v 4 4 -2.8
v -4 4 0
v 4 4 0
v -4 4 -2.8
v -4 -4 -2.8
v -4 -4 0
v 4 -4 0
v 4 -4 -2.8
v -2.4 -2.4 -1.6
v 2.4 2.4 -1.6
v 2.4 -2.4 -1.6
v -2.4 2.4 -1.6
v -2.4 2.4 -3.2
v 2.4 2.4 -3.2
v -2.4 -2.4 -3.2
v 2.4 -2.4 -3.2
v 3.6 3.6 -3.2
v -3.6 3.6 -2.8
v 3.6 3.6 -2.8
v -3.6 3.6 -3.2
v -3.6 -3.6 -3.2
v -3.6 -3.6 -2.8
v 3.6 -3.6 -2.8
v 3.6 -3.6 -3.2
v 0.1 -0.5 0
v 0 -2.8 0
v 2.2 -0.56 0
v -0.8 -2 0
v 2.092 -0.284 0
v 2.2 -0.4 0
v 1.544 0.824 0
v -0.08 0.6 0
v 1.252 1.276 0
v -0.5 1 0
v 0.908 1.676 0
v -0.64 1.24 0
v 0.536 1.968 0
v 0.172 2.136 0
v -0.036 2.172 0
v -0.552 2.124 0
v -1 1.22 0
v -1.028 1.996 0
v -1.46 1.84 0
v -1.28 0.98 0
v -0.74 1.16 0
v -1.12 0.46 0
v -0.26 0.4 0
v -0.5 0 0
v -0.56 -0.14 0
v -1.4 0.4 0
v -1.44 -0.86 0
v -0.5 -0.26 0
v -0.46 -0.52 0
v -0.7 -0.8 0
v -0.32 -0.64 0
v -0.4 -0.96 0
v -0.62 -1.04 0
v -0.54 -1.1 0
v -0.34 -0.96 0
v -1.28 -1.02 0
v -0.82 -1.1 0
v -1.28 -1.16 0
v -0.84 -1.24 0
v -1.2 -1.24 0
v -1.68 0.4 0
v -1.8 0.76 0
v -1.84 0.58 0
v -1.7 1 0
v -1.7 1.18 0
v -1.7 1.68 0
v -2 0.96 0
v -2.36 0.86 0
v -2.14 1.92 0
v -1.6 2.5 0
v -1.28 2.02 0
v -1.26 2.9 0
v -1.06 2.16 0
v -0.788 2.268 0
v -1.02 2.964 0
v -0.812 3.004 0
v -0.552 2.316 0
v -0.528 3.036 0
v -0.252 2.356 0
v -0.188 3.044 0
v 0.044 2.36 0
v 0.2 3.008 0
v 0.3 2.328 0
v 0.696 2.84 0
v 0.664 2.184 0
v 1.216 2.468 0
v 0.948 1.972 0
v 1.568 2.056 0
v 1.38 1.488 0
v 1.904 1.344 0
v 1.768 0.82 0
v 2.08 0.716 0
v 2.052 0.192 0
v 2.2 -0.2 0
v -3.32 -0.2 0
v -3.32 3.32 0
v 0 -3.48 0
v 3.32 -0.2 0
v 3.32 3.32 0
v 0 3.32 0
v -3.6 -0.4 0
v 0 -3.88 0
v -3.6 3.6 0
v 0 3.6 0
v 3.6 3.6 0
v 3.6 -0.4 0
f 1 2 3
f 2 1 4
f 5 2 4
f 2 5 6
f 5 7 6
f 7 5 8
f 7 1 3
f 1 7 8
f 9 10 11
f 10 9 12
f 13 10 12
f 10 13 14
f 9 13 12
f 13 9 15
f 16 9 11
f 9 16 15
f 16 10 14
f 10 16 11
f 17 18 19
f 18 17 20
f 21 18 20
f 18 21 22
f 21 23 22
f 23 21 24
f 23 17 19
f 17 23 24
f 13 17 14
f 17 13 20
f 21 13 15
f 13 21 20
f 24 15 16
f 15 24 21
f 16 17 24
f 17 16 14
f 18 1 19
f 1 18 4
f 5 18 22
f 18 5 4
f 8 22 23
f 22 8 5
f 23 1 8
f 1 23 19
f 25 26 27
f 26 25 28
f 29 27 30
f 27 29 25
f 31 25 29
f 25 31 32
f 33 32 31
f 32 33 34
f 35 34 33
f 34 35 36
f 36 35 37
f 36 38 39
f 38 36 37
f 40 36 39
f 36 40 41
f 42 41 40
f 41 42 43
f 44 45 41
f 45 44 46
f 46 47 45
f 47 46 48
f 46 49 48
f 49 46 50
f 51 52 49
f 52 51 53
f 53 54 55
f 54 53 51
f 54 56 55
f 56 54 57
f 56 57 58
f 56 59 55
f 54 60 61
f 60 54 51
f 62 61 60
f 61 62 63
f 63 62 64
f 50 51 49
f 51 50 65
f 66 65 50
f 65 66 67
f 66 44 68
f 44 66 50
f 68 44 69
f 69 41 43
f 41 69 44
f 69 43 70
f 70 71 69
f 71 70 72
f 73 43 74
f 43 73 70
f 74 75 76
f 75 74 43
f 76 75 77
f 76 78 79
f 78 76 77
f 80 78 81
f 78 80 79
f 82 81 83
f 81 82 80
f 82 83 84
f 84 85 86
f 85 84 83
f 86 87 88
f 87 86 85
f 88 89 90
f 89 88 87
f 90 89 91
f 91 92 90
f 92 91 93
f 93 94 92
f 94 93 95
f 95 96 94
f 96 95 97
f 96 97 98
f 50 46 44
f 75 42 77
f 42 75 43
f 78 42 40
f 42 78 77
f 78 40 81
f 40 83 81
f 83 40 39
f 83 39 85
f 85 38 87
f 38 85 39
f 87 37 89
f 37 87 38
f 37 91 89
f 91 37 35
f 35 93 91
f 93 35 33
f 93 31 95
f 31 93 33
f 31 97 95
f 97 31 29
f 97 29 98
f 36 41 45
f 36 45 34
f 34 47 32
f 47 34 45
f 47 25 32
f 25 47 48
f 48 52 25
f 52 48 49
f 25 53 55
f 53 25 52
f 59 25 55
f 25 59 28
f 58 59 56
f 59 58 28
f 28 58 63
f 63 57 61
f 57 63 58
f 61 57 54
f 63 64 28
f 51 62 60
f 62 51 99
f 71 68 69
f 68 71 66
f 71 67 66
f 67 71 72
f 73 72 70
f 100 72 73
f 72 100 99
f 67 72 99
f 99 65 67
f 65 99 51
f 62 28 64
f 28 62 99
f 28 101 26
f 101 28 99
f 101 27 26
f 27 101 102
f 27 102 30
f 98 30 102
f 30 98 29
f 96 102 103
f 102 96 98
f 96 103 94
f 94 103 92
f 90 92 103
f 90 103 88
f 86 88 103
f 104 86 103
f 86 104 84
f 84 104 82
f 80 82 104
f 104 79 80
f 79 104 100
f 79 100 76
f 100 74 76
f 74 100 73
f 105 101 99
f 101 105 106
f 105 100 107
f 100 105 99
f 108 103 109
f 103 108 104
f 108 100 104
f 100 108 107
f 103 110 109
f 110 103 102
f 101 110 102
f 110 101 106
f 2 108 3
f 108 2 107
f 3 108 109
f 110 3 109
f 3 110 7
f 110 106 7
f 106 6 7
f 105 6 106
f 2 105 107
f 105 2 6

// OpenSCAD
// file: ../p/box5.scad
use <../lib.scad>
function ldraw_lib__box5() = [
// 0 Box with 5 Faces and All Edges
// 0 Name: box5.dat
// 0 Author: James Jessiman
// 0 !LDRAW_ORG Primitive UPDATE 2012-01
// 0 !LICENSE Licensed under CC BY 4.0 : see CAreadme.txt
// 
// 0 BFC CERTIFY CCW
  [0,"BFC","CERTIFY"],
  [0,"BFC","CCW"],
// 
// 0 !HISTORY 2002-04-03 [sbliss] Modified for BFC compliance
// 0 !HISTORY 2002-04-25 [PTadmin] Official Update 2002-02
// 0 !HISTORY 2007-06-24 [PTadmin] Header formatted for Contributor Agreement
// 0 !HISTORY 2008-07-01 [PTadmin] Official Update 2008-01
// 0 !HISTORY 2012-02-16 [Philo] Changed to CCW
// 0 !HISTORY 2012-03-30 [PTadmin] Official Update 2012-01
// 
// 
// 2 24 1 1 1 -1 1 1
  [2,24,1,1,1,-1,1,1],
// 2 24 -1 1 1 -1 1 -1
  [2,24,-1,1,1,-1,1,-1],
// 2 24 -1 1 -1 1 1 -1
  [2,24,-1,1,-1,1,1,-1],
// 2 24 1 1 -1 1 1 1
  [2,24,1,1,-1,1,1,1],
// 2 24 1 0 1 -1 0 1
  [2,24,1,0,1,-1,0,1],
// 2 24 -1 0 1 -1 0 -1
  [2,24,-1,0,1,-1,0,-1],
// 2 24 -1 0 -1 1 0 -1
  [2,24,-1,0,-1,1,0,-1],
// 2 24 1 0 -1 1 0 1
  [2,24,1,0,-1,1,0,1],
// 2 24 1 0 1 1 1 1
  [2,24,1,0,1,1,1,1],
// 2 24 -1 0 1 -1 1 1
  [2,24,-1,0,1,-1,1,1],
// 2 24 1 0 -1 1 1 -1
  [2,24,1,0,-1,1,1,-1],
// 2 24 -1 0 -1 -1 1 -1
  [2,24,-1,0,-1,-1,1,-1],
// 4 16 -1 1 1 1 1 1 1 1 -1 -1 1 -1
  [4,16,-1,1,1,1,1,1,1,1,-1,-1,1,-1],
// 4 16 -1 1 1 -1 0 1 1 0 1 1 1 1
  [4,16,-1,1,1,-1,0,1,1,0,1,1,1,1],
// 4 16 -1 1 -1 -1 0 -1 -1 0 1 -1 1 1
  [4,16,-1,1,-1,-1,0,-1,-1,0,1,-1,1,1],
// 4 16 1 1 -1 1 0 -1 -1 0 -1 -1 1 -1
  [4,16,1,1,-1,1,0,-1,-1,0,-1,-1,1,-1],
// 4 16 1 1 1 1 0 1 1 0 -1 1 1 -1
  [4,16,1,1,1,1,0,1,1,0,-1,1,1,-1],
];
module ldraw_lib__box5(step=0, col=false, unit=2/5, alt=false, line=0.2, solid=!$preview)
    makepoly(ldraw_lib__box5(), step=step, col=col, unit=unit, alt=alt, line=line, solid=solid);
ldraw_lib__box5(line=0.2);
// file: ../p/box4.scad
use <../lib.scad>
function ldraw_lib__box4() = [
// 0 Box with 4 Faces (2 Parallel Pairs) and All Edges
// 0 Name: box4.dat
// 0 Author: James Jessiman
// 0 !LDRAW_ORG Primitive UPDATE 2012-01
// 0 !LICENSE Licensed under CC BY 4.0 : see CAreadme.txt
// 
// 0 BFC CERTIFY CCW
  [0,"BFC","CERTIFY"],
  [0,"BFC","CCW"],
// 
// 0 !HISTORY 2002-04-03 [sbliss] Modified for BFC compliance
// 0 !HISTORY 2002-04-25 [PTadmin] Official Update 2002-02
// 0 !HISTORY 2007-06-24 [PTadmin] Header formatted for Contributor Agreement
// 0 !HISTORY 2008-07-01 [PTadmin] Official Update 2008-01
// 0 !HISTORY 2012-02-16 [Philo] Changed to CCW
// 0 !HISTORY 2012-03-30 [PTadmin] Official Update 2012-01
// 
// 
// 2 24 1 1 1 -1 1 1
  [2,24,1,1,1,-1,1,1],
// 2 24 -1 1 1 -1 1 -1
  [2,24,-1,1,1,-1,1,-1],
// 2 24 -1 1 -1 1 1 -1
  [2,24,-1,1,-1,1,1,-1],
// 2 24 1 1 -1 1 1 1
  [2,24,1,1,-1,1,1,1],
// 2 24 1 0 1 -1 0 1
  [2,24,1,0,1,-1,0,1],
// 2 24 -1 0 1 -1 0 -1
  [2,24,-1,0,1,-1,0,-1],
// 2 24 -1 0 -1 1 0 -1
  [2,24,-1,0,-1,1,0,-1],
// 2 24 1 0 -1 1 0 1
  [2,24,1,0,-1,1,0,1],
// 2 24 1 0 1 1 1 1
  [2,24,1,0,1,1,1,1],
// 2 24 -1 0 1 -1 1 1
  [2,24,-1,0,1,-1,1,1],
// 2 24 1 0 -1 1 1 -1
  [2,24,1,0,-1,1,1,-1],
// 2 24 -1 0 -1 -1 1 -1
  [2,24,-1,0,-1,-1,1,-1],
// 4 16 -1 1 1 -1 0 1 1 0 1 1 1 1
  [4,16,-1,1,1,-1,0,1,1,0,1,1,1,1],
// 4 16 -1 1 -1 -1 0 -1 -1 0 1 -1 1 1
  [4,16,-1,1,-1,-1,0,-1,-1,0,1,-1,1,1],
// 4 16 1 1 -1 1 0 -1 -1 0 -1 -1 1 -1
  [4,16,1,1,-1,1,0,-1,-1,0,-1,-1,1,-1],
// 4 16 1 1 1 1 0 1 1 0 -1 1 1 -1
  [4,16,1,1,1,1,0,1,1,0,-1,1,1,-1],
];
module ldraw_lib__box4(step=0, col=false, unit=2/5, alt=false, line=0.2, solid=!$preview)
    makepoly(ldraw_lib__box4(), step=step, col=col, unit=unit, alt=alt, line=line, solid=solid);
ldraw_lib__box4(line=0.2);
// file: s/3070bs01.scad
use <../../lib.scad>
use <../../p/box4.scad>
use <../../p/box5.scad>
function ldraw_lib__s__3070bs01() = [
// 0 ~Tile  1 x  1 with Groove without Top Face
// 0 Name: s\3070bs01.dat
// 0 Author: Chris Dee [cwdee]
// 0 !LDRAW_ORG Subpart UPDATE 2009-02
// 0 !LICENSE Licensed under CC BY 4.0 : see CAreadme.txt
// 
// 0 BFC CERTIFY CCW
  [0,"BFC","CERTIFY"],
  [0,"BFC","CCW"],
// 
// 0 !HISTORY 2009-09-03 [PTadmin] Official Update 2009-02
// 
// 
// 1 16 0 0 0 10 0 0 0 7 0 0 0 10 box4.dat
  [1,16,0,0,0,10,0,0,0,7,0,0,0,10, ldraw_lib__box4()],
// 0 BFC INVERTNEXT
  [0,"BFC","INVERTNEXT"],
// 1 16 0 8 0 6 0 0 0 -4 0 0 0 6 box5.dat
  [1,16,0,8,0,6,0,0,0,-4,0,0,0,6, ldraw_lib__box5()],
// 1 16 0 7 0 9 0 0 0 1 0 0 0 9 box4.dat
  [1,16,0,7,0,9,0,0,0,1,0,0,0,9, ldraw_lib__box4()],
// 
// 4 16 9 8 9 6 8 6 -6 8 6 -9 8 9
  [4,16,9,8,9,6,8,6,-6,8,6,-9,8,9],
// 4 16 -9 8 9 -6 8 6 -6 8 -6 -9 8 -9
  [4,16,-9,8,9,-6,8,6,-6,8,-6,-9,8,-9],
// 4 16 -9 8 -9 -6 8 -6 6 8 -6 9 8 -9
  [4,16,-9,8,-9,-6,8,-6,6,8,-6,9,8,-9],
// 4 16 9 8 -9 6 8 -6 6 8 6 9 8 9
  [4,16,9,8,-9,6,8,-6,6,8,6,9,8,9],
// 
// 4 16 10 7 10 9 7 9 -9 7 9 -10 7 10
  [4,16,10,7,10,9,7,9,-9,7,9,-10,7,10],
// 4 16 -10 7 10 -9 7 9 -9 7 -9 -10 7 -10
  [4,16,-10,7,10,-9,7,9,-9,7,-9,-10,7,-10],
// 4 16 -10 7 -10 -9 7 -9 9 7 -9 10 7 -10
  [4,16,-10,7,-10,-9,7,-9,9,7,-9,10,7,-10],
// 4 16 10 7 -10 9 7 -9 9 7 9 10 7 10
  [4,16,10,7,-10,9,7,-9,9,7,9,10,7,10],
// 0
];
module ldraw_lib__s__3070bs01(step=0, col=false, unit=2/5, alt=false, line=0.2, solid=!$preview)
    makepoly(ldraw_lib__s__3070bs01(), step=step, col=col, unit=unit, alt=alt, line=line, solid=solid);
ldraw_lib__s__3070bs01(line=0.2);
// file: s/3070bpe0s02.scad
use <../../lib.scad>
function ldraw_lib__s__3070bpe0s02() = [
// 0 ~Pentagonal Shield Frame
// 0 Name: s\3070bpe0s02.dat
// 0 Author: Johann Eisner [technicbasics]
// 0 !LDRAW_ORG Subpart UPDATE 2019-03
// 0 !LICENSE Licensed under CC BY 4.0 : see CAreadme.txt
// 
// 0 BFC CERTIFY CCW
  [0,"BFC","CERTIFY"],
  [0,"BFC","CCW"],
// 
// 0 !HISTORY 2019-12-27 [PTadmin] Official Update 2019-03
// 
// 
// 4 0 -9 0 -1 0 0 -9.7 0 0 -8.7 -8.3 0 -0.5
  [4,0,-9,0,-1,0,0,-9.7,0,0,-8.7,-8.3,0,-0.5],
// 4 0 -9 0 9 -9 0 -1 -8.3 0 -.5 -8.3 0 8.3
  [4,0,-9,0,9,-9,0,-1,-8.3,0,-.5,-8.3,0,8.3],
// 4 0 9 0 9 0 0 9 0 0 8.3 8.3 0 8.3
  [4,0,9,0,9,0,0,9,0,0,8.3,8.3,0,8.3],
// 4 0 0 0 9 -9 0 9 -8.3 0 8.3 0 0 8.3
  [4,0,0,0,9,-9,0,9,-8.3,0,8.3,0,0,8.3],
// 4 0 9 0 9 8.3 0 8.3 8.3 0 -.5 9 0 -1
  [4,0,9,0,9,8.3,0,8.3,8.3,0,-.5,9,0,-1],
// 4 0 9 0 -1 8.3 0 -0.5 0 0 -8.7 0 0 -9.7
  [4,0,9,0,-1,8.3,0,-0.5,0,0,-8.7,0,0,-9.7],
// 4 16 -10 0 10 -9 0 9 0 0 9 10 0 10
  [4,16,-10,0,10,-9,0,9,0,0,9,10,0,10],
// 3 16 10 0 10 0 0 9 9 0 9
  [3,16,10,0,10,0,0,9,9,0,9],
// 4 16 10 0 10 9 0 9 9 0 -1 10 0 -10
  [4,16,10,0,10,9,0,9,9,0,-1,10,0,-10],
// 3 16 9 0 -1 0 0 -9.7 10 0 -10
  [3,16,9,0,-1,0,0,-9.7,10,0,-10],
// 3 16 0 0 -9.7 -10 0 -10 10 0 -10
  [3,16,0,0,-9.7,-10,0,-10,10,0,-10],
// 3 16 -9 0 -1 -10 0 -10 0 0 -9.7
  [3,16,-9,0,-1,-10,0,-10,0,0,-9.7],
// 4 16 -10 0 10 -10 0 -10 -9 0 -1 -9 0 9
  [4,16,-10,0,10,-10,0,-10,-9,0,-1,-9,0,9],
];
module ldraw_lib__s__3070bpe0s02(step=0, col=false, unit=2/5, alt=false, line=0.2, solid=!$preview)
    makepoly(ldraw_lib__s__3070bpe0s02(), step=step, col=col, unit=unit, alt=alt, line=line, solid=solid);
ldraw_lib__s__3070bpe0s02(line=0.2);
// main file
use <../lib.scad>
use <s/3070bpe0s02.scad>
use <s/3070bpe5s01.scad>
use <s/3070bs01.scad>
function ldraw_lib__3070bpe5() = [
// 0 Tile  1 x  1 with White Horse on Pentagonal Shield Pattern
// 0 Name: 3070bpe5.dat
// 0 Author: Vincent Messenet [Cheenzo]
// 0 !LDRAW_ORG Part UPDATE 2020-01
// 0 !LICENSE Licensed under CC BY 4.0 : see CAreadme.txt
// 
// 0 BFC CERTIFY CCW
  [0,"BFC","CERTIFY"],
  [0,"BFC","CCW"],
// 
// 0 !KEYWORDS BrickLink 3070pb092, Nexo Knights, Rebrickable 3070bpr0156
// 0 !KEYWORDS Set 70312
// 
// 0 !HISTORY 2020-06-28 [PTadmin] Official Update 2020-01
// 
// 
// 1 16 0 0 0 1 0 0 0 1 0 0 0 1 s\3070bs01.dat
  [1,16,0,0,0,1,0,0,0,1,0,0,0,1, ldraw_lib__s__3070bs01()],
// 1 16 0 0 0 1 0 0 0 1 0 0 0 1 s\3070bpe5s01.dat
  [1,16,0,0,0,1,0,0,0,1,0,0,0,1, ldraw_lib__s__3070bpe5s01()],
// 1 16 0 0 0 1 0 0 0 1 0 0 0 1 s\3070bpe0s02.dat
  [1,16,0,0,0,1,0,0,0,1,0,0,0,1, ldraw_lib__s__3070bpe0s02()],
];
module ldraw_lib__3070bpe5(step=0, col=false, unit=2/5, alt=false, line=0.2, solid=!$preview)
    makepoly(ldraw_lib__3070bpe5(), step=step, col=col, unit=unit, alt=alt, line=line, solid=solid);
ldraw_lib__3070bpe5(line=0.2);
